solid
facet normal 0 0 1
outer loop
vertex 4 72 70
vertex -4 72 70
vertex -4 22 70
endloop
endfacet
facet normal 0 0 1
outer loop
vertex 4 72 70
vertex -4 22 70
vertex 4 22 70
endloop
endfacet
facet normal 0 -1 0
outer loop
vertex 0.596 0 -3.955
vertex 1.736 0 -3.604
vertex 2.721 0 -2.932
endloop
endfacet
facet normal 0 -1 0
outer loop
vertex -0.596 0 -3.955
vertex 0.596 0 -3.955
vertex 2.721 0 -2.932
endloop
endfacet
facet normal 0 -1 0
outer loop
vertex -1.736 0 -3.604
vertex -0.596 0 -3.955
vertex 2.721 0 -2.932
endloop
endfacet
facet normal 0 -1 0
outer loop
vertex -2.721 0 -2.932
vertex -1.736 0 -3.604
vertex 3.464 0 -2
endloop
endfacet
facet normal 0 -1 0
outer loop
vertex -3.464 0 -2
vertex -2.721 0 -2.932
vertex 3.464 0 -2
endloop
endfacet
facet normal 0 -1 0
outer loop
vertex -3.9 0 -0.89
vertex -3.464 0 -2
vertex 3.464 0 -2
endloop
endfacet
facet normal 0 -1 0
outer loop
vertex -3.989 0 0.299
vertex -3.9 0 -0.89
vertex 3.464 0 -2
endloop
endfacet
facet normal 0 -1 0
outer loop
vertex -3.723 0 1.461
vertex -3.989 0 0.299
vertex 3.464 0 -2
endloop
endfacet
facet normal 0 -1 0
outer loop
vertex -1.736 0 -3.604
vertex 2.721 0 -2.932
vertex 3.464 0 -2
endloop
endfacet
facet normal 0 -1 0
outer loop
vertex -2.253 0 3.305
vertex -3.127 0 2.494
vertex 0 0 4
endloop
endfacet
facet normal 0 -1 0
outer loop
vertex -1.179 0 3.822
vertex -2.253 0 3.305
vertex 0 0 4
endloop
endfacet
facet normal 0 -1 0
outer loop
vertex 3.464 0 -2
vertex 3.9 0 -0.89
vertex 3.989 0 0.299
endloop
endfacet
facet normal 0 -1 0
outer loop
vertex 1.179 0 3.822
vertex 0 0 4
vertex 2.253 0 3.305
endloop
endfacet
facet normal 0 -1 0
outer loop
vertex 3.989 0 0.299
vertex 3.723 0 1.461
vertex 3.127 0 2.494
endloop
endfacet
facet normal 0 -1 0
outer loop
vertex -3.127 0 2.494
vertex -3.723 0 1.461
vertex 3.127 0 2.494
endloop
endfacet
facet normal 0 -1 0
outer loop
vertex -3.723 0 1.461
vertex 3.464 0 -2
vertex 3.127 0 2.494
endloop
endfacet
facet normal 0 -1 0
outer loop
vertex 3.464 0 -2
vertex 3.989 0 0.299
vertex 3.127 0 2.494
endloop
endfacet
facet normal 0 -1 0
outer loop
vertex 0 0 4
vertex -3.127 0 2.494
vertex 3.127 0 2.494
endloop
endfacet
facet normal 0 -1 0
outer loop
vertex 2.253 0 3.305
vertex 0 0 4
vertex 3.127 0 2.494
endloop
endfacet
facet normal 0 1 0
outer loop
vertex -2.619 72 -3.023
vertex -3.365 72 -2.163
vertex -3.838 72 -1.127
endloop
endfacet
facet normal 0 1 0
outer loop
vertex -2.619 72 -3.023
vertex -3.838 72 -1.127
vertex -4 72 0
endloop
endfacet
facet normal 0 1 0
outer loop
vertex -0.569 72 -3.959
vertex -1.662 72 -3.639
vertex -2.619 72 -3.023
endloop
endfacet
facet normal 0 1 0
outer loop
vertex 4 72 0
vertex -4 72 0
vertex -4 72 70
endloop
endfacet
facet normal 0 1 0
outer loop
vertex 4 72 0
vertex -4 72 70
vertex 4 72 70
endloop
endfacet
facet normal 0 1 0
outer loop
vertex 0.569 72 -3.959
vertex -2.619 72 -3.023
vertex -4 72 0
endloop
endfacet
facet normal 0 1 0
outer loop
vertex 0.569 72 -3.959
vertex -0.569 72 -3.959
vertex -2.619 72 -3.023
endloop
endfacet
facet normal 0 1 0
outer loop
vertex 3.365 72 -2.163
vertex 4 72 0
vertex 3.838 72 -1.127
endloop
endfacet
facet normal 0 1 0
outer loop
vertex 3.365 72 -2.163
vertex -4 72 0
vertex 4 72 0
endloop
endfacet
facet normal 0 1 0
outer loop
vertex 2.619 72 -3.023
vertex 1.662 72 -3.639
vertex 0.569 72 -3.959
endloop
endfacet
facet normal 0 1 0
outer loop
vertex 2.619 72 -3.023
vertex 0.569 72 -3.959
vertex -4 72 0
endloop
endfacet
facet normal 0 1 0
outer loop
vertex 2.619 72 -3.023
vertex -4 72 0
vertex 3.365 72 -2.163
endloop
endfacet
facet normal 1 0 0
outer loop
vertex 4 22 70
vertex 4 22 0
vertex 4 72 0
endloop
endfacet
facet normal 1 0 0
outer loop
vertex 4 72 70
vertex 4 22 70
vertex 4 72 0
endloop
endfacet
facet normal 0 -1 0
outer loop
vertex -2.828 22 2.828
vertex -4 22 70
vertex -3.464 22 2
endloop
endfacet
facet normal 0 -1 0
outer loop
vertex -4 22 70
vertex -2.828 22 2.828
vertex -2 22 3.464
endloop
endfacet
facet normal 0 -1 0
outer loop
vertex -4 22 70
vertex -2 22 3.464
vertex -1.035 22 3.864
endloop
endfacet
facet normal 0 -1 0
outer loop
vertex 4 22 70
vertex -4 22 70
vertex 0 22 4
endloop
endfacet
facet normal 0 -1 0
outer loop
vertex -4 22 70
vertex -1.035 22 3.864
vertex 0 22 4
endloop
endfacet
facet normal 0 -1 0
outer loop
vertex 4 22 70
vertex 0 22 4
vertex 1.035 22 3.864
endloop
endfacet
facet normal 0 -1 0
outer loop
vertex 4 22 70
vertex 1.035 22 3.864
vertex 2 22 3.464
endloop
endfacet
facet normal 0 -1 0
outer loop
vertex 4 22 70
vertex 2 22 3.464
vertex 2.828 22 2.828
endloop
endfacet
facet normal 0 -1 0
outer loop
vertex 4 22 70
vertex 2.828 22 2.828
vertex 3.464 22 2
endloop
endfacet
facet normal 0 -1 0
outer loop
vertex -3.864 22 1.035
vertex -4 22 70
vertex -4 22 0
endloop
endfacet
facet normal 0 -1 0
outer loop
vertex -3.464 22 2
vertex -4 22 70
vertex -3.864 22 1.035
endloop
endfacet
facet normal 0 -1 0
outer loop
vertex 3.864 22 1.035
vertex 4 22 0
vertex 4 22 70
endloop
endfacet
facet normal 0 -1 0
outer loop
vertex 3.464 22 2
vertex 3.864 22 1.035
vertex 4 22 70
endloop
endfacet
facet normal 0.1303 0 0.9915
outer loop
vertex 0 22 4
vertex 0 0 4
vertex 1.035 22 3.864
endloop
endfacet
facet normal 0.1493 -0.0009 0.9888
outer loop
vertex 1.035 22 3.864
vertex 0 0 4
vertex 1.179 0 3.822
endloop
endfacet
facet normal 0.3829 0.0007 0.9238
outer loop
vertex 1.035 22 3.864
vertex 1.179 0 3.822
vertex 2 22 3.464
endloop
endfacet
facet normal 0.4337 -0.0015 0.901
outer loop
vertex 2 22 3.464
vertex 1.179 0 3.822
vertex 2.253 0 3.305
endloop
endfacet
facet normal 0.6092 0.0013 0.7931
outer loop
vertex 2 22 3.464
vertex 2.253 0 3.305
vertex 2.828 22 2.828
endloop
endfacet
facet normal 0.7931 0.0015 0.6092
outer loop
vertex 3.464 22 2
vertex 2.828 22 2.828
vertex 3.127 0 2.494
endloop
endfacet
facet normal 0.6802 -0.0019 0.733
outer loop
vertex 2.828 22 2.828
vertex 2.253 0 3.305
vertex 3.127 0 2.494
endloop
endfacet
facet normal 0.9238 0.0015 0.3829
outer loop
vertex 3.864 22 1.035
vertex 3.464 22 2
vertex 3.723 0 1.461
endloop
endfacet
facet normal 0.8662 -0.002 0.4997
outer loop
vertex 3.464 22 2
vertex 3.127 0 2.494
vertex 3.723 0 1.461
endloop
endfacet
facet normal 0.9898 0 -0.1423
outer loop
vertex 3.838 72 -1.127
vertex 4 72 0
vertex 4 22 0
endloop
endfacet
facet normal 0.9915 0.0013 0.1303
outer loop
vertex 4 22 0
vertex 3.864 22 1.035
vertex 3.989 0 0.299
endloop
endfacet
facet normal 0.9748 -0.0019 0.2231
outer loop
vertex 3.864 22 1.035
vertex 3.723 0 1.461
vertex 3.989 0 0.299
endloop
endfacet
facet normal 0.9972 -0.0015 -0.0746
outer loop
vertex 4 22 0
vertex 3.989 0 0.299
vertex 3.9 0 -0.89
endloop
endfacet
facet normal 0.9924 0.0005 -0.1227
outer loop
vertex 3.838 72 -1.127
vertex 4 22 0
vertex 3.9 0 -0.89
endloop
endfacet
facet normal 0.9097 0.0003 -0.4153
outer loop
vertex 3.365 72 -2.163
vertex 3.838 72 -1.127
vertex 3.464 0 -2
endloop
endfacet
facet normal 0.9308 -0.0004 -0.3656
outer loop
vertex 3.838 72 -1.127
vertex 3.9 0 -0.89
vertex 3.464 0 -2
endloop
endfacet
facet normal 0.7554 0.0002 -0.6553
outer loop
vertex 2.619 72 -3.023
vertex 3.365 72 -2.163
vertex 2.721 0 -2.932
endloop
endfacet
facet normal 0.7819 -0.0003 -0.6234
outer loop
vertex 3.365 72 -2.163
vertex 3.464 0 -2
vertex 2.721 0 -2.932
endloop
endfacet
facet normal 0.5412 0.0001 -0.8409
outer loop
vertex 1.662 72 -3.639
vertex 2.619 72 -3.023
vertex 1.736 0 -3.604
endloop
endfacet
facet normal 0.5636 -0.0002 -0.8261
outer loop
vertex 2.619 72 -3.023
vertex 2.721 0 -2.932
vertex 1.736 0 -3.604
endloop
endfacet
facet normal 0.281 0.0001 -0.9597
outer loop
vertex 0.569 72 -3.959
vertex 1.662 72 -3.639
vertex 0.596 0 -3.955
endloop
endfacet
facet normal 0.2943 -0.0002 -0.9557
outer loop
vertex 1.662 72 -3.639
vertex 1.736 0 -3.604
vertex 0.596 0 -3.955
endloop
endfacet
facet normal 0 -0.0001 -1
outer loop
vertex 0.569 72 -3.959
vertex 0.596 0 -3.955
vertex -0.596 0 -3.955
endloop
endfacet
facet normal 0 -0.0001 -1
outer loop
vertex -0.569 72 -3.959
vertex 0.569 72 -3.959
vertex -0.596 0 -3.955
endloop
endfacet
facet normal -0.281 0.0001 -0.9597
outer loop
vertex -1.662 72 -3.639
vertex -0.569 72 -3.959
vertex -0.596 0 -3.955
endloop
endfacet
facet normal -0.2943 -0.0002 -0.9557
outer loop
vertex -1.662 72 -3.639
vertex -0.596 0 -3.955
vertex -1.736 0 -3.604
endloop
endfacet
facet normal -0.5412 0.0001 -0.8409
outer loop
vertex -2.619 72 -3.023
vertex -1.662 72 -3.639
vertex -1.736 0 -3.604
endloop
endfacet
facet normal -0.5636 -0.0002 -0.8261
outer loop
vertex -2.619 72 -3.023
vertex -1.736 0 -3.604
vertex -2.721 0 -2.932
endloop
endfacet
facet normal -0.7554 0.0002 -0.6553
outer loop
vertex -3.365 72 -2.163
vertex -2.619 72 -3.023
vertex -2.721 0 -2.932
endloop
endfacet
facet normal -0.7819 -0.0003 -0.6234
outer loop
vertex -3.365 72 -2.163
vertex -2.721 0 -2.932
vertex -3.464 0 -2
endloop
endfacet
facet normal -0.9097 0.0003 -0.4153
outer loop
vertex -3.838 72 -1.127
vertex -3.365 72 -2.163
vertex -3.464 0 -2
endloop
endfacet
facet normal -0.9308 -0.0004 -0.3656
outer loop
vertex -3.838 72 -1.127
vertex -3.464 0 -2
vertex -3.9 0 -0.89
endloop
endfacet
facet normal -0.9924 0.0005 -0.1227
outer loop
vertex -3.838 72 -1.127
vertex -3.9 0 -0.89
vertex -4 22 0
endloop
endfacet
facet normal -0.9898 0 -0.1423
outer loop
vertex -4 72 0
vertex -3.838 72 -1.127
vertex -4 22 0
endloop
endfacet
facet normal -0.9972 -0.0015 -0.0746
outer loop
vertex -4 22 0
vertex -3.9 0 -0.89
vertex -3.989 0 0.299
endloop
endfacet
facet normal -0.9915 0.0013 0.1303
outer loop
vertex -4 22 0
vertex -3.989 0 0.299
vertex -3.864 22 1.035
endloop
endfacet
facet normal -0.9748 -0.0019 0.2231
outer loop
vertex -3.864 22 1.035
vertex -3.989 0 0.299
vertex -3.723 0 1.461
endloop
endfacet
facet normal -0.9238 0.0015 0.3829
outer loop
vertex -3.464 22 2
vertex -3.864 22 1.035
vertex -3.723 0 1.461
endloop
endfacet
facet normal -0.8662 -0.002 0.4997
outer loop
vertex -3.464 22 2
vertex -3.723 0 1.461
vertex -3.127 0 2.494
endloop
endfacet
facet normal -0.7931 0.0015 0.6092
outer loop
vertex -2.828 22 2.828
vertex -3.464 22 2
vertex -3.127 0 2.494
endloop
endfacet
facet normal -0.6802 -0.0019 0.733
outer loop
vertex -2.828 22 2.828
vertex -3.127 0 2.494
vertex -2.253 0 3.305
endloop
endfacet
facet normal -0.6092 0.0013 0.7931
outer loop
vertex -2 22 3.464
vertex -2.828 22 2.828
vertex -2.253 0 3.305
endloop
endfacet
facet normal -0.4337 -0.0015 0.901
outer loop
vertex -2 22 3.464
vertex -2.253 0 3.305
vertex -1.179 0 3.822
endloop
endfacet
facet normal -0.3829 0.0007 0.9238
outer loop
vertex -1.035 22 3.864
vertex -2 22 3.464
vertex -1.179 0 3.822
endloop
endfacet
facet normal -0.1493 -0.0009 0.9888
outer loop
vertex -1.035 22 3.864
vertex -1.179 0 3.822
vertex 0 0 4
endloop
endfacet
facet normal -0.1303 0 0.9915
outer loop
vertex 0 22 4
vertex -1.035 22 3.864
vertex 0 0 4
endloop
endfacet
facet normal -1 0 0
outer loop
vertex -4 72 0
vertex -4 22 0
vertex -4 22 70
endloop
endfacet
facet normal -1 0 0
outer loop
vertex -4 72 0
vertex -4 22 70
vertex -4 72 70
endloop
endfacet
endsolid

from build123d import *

# Parameters (mm, degrees)
SKETCH1_R           = 4
BOSS_EXTRUDE1_DEPTH = 72
SKETCH2_W           = 8
SKETCH2_H           = 50
BOSS_EXTRUDE2_DEPTH = 70


with BuildPart() as part:
    # Sketch1 → Boss-Extrude1 (new body)
    with BuildSketch(Plane(origin=(0, 0, 0), x_dir=(1, 0, 0), z_dir=(0, 1, 0))):
        with Locations(Location((0, 0, 0), (0, 0, 270))):
            Circle(SKETCH1_R)
    extrude(amount=BOSS_EXTRUDE1_DEPTH)

    # Sketch2 → Boss-Extrude2 (add)
    with BuildSketch(Plane.XY):
        with Locations((0, 47)):
            Rectangle(SKETCH2_W, SKETCH2_H)
    extrude(amount=BOSS_EXTRUDE2_DEPTH)


solid = part.part
